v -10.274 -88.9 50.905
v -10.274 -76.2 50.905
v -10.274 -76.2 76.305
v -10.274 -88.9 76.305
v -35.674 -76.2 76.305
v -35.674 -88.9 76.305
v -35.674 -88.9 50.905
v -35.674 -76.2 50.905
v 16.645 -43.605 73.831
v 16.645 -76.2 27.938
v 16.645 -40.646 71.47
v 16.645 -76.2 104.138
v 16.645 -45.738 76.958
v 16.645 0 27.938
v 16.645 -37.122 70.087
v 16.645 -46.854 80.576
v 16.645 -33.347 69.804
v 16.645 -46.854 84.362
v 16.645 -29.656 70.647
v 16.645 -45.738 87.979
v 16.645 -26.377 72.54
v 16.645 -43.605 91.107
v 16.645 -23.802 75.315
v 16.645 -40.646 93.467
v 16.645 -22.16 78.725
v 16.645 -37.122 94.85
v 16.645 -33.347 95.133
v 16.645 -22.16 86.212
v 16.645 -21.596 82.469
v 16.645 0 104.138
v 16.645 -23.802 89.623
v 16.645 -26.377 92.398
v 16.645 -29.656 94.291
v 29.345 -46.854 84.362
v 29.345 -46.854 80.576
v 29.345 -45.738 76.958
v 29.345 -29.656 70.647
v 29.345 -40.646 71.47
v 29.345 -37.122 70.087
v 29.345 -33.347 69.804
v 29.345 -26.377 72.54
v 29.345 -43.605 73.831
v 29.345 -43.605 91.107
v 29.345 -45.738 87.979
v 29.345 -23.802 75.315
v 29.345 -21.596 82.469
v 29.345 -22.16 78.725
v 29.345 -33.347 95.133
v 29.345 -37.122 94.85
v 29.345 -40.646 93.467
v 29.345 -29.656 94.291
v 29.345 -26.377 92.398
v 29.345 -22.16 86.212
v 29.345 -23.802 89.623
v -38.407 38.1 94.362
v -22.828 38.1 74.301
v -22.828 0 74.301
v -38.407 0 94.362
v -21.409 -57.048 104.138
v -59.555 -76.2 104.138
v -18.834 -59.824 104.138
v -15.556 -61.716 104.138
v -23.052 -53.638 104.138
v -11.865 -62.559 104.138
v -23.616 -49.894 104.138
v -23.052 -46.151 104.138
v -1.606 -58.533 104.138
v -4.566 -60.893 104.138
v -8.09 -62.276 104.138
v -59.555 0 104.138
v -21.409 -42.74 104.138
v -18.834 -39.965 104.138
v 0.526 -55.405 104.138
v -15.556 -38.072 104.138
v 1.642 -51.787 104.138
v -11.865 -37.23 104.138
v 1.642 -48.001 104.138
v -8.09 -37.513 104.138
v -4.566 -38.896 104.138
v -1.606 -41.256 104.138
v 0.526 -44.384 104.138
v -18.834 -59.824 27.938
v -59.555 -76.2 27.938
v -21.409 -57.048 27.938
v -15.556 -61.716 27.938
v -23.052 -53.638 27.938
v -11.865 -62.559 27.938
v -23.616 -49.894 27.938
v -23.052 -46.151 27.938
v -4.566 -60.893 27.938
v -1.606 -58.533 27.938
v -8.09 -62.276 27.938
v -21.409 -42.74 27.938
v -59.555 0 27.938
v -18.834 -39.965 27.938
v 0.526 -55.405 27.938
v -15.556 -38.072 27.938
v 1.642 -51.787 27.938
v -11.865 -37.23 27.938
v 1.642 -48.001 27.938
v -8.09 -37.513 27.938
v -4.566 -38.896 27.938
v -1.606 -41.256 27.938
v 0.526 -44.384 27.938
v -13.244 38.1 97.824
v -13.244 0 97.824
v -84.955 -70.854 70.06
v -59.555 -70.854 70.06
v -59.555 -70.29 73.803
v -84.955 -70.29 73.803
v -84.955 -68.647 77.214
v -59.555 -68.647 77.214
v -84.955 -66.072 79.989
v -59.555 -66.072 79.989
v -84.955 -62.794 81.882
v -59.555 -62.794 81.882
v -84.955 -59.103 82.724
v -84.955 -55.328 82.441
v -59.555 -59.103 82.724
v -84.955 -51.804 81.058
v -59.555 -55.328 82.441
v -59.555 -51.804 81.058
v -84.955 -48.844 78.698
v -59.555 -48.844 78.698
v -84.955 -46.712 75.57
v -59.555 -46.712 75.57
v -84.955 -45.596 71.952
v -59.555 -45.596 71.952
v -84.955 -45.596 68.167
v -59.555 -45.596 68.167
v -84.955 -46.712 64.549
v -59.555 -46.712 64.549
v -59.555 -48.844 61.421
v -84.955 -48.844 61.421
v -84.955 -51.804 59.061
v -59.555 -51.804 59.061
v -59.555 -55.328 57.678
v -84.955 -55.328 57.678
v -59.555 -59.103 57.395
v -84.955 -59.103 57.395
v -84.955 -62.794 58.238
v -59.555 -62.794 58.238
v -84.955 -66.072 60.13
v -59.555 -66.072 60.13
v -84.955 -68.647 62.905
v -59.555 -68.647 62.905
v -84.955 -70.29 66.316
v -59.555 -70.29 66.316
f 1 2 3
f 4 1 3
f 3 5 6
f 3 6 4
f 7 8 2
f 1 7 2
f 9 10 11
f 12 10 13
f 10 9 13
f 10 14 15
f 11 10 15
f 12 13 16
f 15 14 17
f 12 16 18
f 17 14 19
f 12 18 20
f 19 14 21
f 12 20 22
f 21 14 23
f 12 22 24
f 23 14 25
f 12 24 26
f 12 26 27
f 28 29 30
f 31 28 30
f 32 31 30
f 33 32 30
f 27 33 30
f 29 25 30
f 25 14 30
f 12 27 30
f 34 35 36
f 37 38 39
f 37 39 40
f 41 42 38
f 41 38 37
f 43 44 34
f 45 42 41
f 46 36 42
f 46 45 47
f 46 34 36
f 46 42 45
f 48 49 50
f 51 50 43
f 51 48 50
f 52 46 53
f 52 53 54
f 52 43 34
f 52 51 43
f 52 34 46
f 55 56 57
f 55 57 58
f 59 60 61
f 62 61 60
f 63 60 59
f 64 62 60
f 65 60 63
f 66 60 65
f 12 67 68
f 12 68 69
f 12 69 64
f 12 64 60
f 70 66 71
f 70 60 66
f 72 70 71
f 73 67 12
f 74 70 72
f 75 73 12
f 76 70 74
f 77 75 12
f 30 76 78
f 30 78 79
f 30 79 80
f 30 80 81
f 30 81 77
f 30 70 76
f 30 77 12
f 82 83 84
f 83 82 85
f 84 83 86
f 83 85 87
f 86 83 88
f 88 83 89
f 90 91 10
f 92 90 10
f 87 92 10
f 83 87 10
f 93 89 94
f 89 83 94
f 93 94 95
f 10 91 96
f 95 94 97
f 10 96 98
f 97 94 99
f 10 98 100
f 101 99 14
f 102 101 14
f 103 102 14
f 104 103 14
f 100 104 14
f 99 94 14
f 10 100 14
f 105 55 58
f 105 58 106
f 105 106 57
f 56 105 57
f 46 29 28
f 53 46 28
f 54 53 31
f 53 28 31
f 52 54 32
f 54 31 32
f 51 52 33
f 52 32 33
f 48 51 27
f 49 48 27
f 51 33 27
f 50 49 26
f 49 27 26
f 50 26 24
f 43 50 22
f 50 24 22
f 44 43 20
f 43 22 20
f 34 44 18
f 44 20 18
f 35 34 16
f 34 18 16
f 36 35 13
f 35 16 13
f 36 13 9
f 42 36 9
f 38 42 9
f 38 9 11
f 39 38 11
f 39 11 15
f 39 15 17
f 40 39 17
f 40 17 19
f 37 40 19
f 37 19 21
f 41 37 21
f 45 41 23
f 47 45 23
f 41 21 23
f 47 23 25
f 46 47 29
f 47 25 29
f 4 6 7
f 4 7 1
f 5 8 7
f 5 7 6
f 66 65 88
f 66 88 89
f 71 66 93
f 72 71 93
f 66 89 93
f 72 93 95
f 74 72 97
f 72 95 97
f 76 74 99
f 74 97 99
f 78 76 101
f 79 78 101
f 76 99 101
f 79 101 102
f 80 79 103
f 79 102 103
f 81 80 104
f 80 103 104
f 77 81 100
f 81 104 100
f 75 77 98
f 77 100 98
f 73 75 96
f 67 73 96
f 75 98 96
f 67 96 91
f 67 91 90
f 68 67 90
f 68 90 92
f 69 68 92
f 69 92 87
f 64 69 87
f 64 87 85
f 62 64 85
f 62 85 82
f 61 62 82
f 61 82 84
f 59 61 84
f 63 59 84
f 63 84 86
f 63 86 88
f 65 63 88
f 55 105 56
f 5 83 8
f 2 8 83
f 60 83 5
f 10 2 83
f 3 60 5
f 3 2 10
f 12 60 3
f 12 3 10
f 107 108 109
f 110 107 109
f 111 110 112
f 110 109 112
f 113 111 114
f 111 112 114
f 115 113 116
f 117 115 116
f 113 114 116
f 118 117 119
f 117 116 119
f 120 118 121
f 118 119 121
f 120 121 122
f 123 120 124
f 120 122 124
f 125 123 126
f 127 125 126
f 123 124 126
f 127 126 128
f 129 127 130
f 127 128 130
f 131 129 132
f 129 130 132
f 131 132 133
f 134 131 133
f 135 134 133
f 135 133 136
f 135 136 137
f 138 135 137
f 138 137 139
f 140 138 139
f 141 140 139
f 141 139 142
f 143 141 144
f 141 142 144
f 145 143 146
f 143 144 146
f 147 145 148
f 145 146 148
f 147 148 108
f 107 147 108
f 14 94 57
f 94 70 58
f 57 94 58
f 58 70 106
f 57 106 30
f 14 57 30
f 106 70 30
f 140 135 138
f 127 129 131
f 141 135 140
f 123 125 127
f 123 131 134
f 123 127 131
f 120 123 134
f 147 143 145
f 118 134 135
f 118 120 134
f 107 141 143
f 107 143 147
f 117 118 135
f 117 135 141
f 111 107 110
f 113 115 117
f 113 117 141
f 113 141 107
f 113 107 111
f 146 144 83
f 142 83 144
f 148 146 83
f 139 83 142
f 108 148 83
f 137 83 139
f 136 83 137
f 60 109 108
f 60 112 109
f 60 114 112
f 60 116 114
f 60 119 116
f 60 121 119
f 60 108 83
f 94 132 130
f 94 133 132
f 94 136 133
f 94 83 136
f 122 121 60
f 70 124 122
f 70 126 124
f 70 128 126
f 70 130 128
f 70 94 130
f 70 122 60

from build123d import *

# Parameters (mm, degrees)
F0_W      = 76.2
F0_H      = 76.2
F1_DEPTH  = 76.2
F2_W      = 25.4
F2_H      = 25.4
F3_DEPTH  = 12.7
F4_R      = 12.7
F5_DEPTH  = 12.7
F7_D      = 25.4
F9_DEPTH  = 38.1
F10_R     = 12.7
F11_DEPTH = 25.4


with BuildPart() as f1:
    # F0 (on Front) → F1 (new body)
    with BuildSketch(Plane.XZ):
        with Locations((-21.454936, 66.037557)):
            Rectangle(F0_W, F0_H)
    extrude(amount=F1_DEPTH)

    # F2 (on face) → F3 (join)
    with BuildSketch(Plane.XZ.offset(76.2)):
        with Locations((-22.974357, 63.60508)):
            Rectangle(F2_W, F2_H)
    extrude(amount=F3_DEPTH)

    # F4 (on face) → F5 (join)
    with BuildSketch(Plane.YZ.offset(16.645064)):
        with Locations((-34.295596, 82.468808)):
            Circle(F4_R)
    extrude(amount=F5_DEPTH)

    # F7 (through all)
    with Locations(Plane.XY.offset(104.137557)):
        with Locations((-10.916158, -49.894316)):
            Hole(F7_D / 2)

    # F8 (on face) → F9 (join)
    with BuildSketch(Plane(origin=(0, 0, 0), x_dir=(-1, 0, 0), z_dir=(0, 1, 0))):
        Polygon((13.244484, 97.82351), (22.827807, 74.300757), (38.407448, 94.361535), align=None)
    extrude(amount=F9_DEPTH)

    # F10 (on face) → F11 (join)
    with BuildSketch(Plane(origin=(-59.554936, 0, 0), x_dir=(0, -1, 0), z_dir=(-1, 0, 0))):
        with Locations((58.153983, 70.059642)):
            Circle(F10_R)
    extrude(amount=F11_DEPTH)


solid = f1.part
